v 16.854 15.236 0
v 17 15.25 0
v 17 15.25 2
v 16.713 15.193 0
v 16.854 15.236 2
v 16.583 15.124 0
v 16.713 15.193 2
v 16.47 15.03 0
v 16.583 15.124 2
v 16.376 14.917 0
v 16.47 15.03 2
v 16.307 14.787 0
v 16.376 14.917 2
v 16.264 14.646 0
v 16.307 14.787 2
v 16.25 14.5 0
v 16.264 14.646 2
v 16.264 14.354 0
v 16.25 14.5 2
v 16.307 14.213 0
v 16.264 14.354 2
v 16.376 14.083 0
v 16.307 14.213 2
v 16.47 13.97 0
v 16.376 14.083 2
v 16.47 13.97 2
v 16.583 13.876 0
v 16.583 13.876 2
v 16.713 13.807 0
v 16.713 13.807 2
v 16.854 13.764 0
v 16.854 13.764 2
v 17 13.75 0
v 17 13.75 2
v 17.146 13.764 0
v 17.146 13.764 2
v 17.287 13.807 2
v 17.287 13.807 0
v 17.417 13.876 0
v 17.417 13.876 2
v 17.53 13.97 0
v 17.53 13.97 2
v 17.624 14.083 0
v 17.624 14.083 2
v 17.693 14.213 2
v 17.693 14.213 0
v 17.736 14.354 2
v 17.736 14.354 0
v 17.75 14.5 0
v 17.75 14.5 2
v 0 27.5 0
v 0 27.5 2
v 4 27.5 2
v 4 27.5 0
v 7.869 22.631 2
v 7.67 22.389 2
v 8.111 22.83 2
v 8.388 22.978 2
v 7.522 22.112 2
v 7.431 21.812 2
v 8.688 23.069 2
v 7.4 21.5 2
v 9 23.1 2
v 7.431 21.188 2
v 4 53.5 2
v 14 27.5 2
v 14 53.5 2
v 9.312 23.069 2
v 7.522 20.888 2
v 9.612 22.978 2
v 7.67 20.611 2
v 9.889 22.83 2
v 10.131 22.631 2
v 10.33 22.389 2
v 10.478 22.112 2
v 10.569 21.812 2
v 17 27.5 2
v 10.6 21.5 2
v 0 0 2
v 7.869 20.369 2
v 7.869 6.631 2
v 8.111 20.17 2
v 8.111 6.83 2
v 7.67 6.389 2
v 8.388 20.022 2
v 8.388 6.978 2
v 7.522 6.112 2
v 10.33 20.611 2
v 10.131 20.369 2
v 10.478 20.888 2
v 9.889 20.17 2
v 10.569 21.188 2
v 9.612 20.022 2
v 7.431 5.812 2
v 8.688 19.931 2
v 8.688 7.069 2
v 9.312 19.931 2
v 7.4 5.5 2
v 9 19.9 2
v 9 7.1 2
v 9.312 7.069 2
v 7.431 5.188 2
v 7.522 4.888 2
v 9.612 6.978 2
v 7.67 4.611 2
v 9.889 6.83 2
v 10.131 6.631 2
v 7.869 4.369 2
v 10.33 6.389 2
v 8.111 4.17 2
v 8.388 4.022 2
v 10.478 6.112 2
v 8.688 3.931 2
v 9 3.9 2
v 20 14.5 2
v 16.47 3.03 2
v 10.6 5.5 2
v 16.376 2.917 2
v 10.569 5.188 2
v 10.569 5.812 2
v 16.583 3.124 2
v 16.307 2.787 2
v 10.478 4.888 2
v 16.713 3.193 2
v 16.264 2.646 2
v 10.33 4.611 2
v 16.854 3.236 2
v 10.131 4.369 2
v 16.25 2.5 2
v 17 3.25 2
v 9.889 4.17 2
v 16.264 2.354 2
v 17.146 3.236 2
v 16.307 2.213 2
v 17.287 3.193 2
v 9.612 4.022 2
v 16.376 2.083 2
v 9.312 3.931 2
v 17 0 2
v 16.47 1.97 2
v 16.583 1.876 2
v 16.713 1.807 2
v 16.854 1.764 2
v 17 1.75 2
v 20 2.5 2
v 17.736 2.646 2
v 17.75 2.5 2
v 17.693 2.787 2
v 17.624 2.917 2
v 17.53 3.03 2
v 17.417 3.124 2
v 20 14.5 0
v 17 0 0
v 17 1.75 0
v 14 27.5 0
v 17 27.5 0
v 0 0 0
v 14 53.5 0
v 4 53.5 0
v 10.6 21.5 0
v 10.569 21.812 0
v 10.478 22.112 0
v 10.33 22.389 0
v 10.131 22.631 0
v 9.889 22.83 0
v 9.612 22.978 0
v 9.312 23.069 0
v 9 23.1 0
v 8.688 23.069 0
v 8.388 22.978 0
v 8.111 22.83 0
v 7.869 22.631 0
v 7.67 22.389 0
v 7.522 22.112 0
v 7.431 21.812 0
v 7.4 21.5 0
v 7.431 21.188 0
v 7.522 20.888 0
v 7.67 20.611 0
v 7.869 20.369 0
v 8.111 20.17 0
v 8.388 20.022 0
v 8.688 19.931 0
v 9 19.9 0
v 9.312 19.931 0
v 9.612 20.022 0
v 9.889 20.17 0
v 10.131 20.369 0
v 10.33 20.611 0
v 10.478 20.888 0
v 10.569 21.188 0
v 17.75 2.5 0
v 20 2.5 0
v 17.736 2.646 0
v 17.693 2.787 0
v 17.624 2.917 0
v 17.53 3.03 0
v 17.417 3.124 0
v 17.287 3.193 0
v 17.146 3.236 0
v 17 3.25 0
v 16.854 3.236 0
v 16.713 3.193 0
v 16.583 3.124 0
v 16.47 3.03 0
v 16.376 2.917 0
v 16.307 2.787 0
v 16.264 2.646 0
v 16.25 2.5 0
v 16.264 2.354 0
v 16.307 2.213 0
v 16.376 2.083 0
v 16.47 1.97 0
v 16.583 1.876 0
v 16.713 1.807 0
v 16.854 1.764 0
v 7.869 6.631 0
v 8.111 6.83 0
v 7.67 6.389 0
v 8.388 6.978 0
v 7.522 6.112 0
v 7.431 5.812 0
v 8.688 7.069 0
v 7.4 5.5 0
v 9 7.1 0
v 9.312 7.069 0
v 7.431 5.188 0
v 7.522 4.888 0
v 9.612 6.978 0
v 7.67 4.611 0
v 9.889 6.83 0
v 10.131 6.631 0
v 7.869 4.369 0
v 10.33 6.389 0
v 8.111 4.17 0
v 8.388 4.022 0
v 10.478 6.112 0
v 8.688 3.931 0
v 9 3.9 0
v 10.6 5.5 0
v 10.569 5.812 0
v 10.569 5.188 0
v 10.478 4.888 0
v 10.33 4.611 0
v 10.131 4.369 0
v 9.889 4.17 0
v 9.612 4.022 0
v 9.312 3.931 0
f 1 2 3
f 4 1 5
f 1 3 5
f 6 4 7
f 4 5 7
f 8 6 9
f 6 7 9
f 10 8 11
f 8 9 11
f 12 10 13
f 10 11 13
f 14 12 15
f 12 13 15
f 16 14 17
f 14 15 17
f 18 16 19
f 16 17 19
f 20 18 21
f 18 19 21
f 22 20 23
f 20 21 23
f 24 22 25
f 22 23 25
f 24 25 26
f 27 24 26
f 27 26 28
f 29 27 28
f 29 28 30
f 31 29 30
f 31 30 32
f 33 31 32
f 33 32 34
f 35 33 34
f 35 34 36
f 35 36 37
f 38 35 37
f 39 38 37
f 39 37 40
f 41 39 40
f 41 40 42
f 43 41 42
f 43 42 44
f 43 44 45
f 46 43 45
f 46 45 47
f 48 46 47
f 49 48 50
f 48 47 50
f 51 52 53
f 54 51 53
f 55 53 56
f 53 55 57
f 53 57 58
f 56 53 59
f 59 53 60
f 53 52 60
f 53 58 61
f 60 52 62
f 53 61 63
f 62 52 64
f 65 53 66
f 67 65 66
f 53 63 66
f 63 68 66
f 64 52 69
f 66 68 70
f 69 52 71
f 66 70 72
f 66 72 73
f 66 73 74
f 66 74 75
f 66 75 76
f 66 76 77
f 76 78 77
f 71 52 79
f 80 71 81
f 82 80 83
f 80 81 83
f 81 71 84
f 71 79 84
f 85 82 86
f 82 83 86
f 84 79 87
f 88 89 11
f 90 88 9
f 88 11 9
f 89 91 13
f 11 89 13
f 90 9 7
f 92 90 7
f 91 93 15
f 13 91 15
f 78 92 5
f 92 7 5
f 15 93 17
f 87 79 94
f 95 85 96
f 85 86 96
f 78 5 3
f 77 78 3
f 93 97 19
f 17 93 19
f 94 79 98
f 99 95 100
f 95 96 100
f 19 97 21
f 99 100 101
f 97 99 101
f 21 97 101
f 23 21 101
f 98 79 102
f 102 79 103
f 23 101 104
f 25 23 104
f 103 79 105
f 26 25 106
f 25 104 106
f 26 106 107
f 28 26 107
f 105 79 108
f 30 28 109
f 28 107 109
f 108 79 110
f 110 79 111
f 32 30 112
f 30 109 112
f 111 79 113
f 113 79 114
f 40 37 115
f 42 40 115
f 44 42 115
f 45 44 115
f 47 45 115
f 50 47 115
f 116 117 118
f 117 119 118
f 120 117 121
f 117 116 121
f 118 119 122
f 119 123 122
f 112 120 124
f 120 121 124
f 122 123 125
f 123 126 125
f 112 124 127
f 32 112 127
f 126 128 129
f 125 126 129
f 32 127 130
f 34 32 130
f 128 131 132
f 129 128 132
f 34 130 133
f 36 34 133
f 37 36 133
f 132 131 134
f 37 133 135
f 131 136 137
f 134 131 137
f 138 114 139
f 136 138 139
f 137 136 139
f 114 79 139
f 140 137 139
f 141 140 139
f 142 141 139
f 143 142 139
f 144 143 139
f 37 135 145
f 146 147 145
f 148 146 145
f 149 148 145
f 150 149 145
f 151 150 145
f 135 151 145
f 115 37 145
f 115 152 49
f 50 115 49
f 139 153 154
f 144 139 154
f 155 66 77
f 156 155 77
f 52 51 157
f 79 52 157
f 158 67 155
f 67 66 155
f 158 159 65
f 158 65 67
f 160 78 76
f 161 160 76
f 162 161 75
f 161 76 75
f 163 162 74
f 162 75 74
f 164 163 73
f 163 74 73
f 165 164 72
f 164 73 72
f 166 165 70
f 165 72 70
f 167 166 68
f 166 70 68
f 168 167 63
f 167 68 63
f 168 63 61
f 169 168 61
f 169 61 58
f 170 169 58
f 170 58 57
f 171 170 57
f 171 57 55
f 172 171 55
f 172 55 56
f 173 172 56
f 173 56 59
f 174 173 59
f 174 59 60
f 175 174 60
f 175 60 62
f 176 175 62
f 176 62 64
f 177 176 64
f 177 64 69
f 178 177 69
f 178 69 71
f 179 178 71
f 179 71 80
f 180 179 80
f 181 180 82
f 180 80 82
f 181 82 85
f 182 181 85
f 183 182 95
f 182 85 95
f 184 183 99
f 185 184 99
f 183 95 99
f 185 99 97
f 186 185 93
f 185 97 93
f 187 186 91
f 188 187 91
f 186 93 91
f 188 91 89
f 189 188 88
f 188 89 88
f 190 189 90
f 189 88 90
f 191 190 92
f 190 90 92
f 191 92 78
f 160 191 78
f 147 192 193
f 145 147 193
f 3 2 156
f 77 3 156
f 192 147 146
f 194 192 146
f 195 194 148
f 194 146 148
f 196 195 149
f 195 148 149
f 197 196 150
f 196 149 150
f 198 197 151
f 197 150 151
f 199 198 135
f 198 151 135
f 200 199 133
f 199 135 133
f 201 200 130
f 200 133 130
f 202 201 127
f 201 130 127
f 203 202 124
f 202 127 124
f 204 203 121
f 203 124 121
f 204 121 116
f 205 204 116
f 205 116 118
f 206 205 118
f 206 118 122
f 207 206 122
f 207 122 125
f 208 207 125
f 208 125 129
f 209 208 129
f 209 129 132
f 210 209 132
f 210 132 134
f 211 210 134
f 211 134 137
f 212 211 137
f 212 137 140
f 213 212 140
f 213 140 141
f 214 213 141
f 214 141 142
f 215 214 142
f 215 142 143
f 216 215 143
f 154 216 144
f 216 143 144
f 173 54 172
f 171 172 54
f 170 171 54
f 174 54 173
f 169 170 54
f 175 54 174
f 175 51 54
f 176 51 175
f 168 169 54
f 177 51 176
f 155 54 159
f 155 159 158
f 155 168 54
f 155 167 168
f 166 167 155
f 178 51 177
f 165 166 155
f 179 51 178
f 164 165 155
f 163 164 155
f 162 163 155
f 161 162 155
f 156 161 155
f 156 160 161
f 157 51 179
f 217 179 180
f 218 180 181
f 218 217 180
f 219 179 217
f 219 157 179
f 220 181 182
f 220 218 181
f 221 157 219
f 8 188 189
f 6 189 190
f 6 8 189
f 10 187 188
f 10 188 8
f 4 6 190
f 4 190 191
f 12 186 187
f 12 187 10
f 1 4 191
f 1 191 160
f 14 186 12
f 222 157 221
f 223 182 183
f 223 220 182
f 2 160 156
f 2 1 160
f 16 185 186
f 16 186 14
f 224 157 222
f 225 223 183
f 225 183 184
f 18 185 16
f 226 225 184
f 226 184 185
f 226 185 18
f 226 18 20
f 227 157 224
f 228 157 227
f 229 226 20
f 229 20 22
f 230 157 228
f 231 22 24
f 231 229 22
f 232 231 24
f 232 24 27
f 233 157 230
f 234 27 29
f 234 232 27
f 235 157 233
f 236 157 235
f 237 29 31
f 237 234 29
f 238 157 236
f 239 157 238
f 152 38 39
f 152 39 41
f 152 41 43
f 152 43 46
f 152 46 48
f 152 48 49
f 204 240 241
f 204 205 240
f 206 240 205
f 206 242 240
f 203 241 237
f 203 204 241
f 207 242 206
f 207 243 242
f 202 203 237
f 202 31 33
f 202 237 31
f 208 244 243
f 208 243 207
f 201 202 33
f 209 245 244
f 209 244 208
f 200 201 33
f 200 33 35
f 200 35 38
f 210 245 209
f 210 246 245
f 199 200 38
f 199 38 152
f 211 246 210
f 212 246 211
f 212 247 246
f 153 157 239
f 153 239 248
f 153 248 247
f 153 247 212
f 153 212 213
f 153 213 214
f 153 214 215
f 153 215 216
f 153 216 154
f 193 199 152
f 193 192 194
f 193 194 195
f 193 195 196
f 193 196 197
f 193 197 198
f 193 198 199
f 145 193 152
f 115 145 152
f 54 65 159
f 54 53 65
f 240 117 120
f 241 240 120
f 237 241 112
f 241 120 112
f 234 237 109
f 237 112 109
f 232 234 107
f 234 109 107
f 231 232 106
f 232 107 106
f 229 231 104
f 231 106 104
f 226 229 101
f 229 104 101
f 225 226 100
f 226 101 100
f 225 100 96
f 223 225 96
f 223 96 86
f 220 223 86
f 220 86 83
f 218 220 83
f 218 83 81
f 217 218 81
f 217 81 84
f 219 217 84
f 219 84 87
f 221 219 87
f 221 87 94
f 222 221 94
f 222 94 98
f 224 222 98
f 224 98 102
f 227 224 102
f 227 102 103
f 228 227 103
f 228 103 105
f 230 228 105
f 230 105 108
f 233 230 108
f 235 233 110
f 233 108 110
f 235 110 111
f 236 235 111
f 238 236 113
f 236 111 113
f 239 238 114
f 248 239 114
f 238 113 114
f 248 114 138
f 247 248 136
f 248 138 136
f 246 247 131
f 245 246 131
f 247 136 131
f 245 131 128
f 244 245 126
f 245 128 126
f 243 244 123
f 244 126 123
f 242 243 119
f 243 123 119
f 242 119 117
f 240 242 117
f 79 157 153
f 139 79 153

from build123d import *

# Parameters (mm, degrees)
EXTRUDE_1_DEPTH     = 2
SKETCH_2_R          = 1.6
CUT_EXTRUDE_1_DEPTH = 3
SKETCH_3_W          = 3
SKETCH_3_H          = 24
SKETCH_3_W_2        = 4
CUT_EXTRUDE_2_DEPTH = 3
SKETCH_4_W          = 10
SKETCH_4_H          = 2
EXTRUDE_2_DEPTH     = 2
SKETCH_5_R          = 0.75
CUT_EXTRUDE_3_DEPTH = 3


with BuildPart() as part:
    # 草图1 → 凸台-拉伸1 (new body)
    with BuildSketch(Plane.XY):
        Polygon((0, 0), (17, 0), (17, 2.5), (20, 2.5), (20, 14.5), (17, 14.5), (17, 51.5), (0, 51.5), align=None)
    extrude(amount=EXTRUDE_1_DEPTH)

    # 草图2 → 切除-拉伸1 (cut, through all)
    with BuildSketch(Plane.XY.offset(2)):
        with Locations((9, 5.5)):
            Circle(SKETCH_2_R)
        with Locations((9, 21.5)):
            Circle(SKETCH_2_R)
    extrude(amount=-CUT_EXTRUDE_1_DEPTH, mode=Mode.SUBTRACT)

    # 草图3 → 切除-拉伸2 (cut, through all)
    with BuildSketch(Plane.XY.offset(2)):
        with Locations((15.5, 39.5)):
            Rectangle(SKETCH_3_W, SKETCH_3_H)
        with Locations((2, 39.5)):
            Rectangle(SKETCH_3_W_2, SKETCH_3_H)
    extrude(amount=-CUT_EXTRUDE_2_DEPTH, mode=Mode.SUBTRACT)

    # 草图4 → 凸台-拉伸2 (add)
    with BuildSketch(Plane(origin=(0, 51.5, 0), x_dir=(1, 0, 0), z_dir=(0, 1, 0))):
        with Locations((9, -1)):
            Rectangle(SKETCH_4_W, SKETCH_4_H)
    extrude(amount=EXTRUDE_2_DEPTH)

    # 草图5 → 切除-拉伸3 (cut)
    with BuildSketch(Plane.XY.offset(2)):
        with Locations((17, 14.5)):
            Circle(SKETCH_5_R)
        with Locations((17, 2.5)):
            Circle(SKETCH_5_R)
    extrude(amount=-CUT_EXTRUDE_3_DEPTH, mode=Mode.SUBTRACT)


solid = part.part
